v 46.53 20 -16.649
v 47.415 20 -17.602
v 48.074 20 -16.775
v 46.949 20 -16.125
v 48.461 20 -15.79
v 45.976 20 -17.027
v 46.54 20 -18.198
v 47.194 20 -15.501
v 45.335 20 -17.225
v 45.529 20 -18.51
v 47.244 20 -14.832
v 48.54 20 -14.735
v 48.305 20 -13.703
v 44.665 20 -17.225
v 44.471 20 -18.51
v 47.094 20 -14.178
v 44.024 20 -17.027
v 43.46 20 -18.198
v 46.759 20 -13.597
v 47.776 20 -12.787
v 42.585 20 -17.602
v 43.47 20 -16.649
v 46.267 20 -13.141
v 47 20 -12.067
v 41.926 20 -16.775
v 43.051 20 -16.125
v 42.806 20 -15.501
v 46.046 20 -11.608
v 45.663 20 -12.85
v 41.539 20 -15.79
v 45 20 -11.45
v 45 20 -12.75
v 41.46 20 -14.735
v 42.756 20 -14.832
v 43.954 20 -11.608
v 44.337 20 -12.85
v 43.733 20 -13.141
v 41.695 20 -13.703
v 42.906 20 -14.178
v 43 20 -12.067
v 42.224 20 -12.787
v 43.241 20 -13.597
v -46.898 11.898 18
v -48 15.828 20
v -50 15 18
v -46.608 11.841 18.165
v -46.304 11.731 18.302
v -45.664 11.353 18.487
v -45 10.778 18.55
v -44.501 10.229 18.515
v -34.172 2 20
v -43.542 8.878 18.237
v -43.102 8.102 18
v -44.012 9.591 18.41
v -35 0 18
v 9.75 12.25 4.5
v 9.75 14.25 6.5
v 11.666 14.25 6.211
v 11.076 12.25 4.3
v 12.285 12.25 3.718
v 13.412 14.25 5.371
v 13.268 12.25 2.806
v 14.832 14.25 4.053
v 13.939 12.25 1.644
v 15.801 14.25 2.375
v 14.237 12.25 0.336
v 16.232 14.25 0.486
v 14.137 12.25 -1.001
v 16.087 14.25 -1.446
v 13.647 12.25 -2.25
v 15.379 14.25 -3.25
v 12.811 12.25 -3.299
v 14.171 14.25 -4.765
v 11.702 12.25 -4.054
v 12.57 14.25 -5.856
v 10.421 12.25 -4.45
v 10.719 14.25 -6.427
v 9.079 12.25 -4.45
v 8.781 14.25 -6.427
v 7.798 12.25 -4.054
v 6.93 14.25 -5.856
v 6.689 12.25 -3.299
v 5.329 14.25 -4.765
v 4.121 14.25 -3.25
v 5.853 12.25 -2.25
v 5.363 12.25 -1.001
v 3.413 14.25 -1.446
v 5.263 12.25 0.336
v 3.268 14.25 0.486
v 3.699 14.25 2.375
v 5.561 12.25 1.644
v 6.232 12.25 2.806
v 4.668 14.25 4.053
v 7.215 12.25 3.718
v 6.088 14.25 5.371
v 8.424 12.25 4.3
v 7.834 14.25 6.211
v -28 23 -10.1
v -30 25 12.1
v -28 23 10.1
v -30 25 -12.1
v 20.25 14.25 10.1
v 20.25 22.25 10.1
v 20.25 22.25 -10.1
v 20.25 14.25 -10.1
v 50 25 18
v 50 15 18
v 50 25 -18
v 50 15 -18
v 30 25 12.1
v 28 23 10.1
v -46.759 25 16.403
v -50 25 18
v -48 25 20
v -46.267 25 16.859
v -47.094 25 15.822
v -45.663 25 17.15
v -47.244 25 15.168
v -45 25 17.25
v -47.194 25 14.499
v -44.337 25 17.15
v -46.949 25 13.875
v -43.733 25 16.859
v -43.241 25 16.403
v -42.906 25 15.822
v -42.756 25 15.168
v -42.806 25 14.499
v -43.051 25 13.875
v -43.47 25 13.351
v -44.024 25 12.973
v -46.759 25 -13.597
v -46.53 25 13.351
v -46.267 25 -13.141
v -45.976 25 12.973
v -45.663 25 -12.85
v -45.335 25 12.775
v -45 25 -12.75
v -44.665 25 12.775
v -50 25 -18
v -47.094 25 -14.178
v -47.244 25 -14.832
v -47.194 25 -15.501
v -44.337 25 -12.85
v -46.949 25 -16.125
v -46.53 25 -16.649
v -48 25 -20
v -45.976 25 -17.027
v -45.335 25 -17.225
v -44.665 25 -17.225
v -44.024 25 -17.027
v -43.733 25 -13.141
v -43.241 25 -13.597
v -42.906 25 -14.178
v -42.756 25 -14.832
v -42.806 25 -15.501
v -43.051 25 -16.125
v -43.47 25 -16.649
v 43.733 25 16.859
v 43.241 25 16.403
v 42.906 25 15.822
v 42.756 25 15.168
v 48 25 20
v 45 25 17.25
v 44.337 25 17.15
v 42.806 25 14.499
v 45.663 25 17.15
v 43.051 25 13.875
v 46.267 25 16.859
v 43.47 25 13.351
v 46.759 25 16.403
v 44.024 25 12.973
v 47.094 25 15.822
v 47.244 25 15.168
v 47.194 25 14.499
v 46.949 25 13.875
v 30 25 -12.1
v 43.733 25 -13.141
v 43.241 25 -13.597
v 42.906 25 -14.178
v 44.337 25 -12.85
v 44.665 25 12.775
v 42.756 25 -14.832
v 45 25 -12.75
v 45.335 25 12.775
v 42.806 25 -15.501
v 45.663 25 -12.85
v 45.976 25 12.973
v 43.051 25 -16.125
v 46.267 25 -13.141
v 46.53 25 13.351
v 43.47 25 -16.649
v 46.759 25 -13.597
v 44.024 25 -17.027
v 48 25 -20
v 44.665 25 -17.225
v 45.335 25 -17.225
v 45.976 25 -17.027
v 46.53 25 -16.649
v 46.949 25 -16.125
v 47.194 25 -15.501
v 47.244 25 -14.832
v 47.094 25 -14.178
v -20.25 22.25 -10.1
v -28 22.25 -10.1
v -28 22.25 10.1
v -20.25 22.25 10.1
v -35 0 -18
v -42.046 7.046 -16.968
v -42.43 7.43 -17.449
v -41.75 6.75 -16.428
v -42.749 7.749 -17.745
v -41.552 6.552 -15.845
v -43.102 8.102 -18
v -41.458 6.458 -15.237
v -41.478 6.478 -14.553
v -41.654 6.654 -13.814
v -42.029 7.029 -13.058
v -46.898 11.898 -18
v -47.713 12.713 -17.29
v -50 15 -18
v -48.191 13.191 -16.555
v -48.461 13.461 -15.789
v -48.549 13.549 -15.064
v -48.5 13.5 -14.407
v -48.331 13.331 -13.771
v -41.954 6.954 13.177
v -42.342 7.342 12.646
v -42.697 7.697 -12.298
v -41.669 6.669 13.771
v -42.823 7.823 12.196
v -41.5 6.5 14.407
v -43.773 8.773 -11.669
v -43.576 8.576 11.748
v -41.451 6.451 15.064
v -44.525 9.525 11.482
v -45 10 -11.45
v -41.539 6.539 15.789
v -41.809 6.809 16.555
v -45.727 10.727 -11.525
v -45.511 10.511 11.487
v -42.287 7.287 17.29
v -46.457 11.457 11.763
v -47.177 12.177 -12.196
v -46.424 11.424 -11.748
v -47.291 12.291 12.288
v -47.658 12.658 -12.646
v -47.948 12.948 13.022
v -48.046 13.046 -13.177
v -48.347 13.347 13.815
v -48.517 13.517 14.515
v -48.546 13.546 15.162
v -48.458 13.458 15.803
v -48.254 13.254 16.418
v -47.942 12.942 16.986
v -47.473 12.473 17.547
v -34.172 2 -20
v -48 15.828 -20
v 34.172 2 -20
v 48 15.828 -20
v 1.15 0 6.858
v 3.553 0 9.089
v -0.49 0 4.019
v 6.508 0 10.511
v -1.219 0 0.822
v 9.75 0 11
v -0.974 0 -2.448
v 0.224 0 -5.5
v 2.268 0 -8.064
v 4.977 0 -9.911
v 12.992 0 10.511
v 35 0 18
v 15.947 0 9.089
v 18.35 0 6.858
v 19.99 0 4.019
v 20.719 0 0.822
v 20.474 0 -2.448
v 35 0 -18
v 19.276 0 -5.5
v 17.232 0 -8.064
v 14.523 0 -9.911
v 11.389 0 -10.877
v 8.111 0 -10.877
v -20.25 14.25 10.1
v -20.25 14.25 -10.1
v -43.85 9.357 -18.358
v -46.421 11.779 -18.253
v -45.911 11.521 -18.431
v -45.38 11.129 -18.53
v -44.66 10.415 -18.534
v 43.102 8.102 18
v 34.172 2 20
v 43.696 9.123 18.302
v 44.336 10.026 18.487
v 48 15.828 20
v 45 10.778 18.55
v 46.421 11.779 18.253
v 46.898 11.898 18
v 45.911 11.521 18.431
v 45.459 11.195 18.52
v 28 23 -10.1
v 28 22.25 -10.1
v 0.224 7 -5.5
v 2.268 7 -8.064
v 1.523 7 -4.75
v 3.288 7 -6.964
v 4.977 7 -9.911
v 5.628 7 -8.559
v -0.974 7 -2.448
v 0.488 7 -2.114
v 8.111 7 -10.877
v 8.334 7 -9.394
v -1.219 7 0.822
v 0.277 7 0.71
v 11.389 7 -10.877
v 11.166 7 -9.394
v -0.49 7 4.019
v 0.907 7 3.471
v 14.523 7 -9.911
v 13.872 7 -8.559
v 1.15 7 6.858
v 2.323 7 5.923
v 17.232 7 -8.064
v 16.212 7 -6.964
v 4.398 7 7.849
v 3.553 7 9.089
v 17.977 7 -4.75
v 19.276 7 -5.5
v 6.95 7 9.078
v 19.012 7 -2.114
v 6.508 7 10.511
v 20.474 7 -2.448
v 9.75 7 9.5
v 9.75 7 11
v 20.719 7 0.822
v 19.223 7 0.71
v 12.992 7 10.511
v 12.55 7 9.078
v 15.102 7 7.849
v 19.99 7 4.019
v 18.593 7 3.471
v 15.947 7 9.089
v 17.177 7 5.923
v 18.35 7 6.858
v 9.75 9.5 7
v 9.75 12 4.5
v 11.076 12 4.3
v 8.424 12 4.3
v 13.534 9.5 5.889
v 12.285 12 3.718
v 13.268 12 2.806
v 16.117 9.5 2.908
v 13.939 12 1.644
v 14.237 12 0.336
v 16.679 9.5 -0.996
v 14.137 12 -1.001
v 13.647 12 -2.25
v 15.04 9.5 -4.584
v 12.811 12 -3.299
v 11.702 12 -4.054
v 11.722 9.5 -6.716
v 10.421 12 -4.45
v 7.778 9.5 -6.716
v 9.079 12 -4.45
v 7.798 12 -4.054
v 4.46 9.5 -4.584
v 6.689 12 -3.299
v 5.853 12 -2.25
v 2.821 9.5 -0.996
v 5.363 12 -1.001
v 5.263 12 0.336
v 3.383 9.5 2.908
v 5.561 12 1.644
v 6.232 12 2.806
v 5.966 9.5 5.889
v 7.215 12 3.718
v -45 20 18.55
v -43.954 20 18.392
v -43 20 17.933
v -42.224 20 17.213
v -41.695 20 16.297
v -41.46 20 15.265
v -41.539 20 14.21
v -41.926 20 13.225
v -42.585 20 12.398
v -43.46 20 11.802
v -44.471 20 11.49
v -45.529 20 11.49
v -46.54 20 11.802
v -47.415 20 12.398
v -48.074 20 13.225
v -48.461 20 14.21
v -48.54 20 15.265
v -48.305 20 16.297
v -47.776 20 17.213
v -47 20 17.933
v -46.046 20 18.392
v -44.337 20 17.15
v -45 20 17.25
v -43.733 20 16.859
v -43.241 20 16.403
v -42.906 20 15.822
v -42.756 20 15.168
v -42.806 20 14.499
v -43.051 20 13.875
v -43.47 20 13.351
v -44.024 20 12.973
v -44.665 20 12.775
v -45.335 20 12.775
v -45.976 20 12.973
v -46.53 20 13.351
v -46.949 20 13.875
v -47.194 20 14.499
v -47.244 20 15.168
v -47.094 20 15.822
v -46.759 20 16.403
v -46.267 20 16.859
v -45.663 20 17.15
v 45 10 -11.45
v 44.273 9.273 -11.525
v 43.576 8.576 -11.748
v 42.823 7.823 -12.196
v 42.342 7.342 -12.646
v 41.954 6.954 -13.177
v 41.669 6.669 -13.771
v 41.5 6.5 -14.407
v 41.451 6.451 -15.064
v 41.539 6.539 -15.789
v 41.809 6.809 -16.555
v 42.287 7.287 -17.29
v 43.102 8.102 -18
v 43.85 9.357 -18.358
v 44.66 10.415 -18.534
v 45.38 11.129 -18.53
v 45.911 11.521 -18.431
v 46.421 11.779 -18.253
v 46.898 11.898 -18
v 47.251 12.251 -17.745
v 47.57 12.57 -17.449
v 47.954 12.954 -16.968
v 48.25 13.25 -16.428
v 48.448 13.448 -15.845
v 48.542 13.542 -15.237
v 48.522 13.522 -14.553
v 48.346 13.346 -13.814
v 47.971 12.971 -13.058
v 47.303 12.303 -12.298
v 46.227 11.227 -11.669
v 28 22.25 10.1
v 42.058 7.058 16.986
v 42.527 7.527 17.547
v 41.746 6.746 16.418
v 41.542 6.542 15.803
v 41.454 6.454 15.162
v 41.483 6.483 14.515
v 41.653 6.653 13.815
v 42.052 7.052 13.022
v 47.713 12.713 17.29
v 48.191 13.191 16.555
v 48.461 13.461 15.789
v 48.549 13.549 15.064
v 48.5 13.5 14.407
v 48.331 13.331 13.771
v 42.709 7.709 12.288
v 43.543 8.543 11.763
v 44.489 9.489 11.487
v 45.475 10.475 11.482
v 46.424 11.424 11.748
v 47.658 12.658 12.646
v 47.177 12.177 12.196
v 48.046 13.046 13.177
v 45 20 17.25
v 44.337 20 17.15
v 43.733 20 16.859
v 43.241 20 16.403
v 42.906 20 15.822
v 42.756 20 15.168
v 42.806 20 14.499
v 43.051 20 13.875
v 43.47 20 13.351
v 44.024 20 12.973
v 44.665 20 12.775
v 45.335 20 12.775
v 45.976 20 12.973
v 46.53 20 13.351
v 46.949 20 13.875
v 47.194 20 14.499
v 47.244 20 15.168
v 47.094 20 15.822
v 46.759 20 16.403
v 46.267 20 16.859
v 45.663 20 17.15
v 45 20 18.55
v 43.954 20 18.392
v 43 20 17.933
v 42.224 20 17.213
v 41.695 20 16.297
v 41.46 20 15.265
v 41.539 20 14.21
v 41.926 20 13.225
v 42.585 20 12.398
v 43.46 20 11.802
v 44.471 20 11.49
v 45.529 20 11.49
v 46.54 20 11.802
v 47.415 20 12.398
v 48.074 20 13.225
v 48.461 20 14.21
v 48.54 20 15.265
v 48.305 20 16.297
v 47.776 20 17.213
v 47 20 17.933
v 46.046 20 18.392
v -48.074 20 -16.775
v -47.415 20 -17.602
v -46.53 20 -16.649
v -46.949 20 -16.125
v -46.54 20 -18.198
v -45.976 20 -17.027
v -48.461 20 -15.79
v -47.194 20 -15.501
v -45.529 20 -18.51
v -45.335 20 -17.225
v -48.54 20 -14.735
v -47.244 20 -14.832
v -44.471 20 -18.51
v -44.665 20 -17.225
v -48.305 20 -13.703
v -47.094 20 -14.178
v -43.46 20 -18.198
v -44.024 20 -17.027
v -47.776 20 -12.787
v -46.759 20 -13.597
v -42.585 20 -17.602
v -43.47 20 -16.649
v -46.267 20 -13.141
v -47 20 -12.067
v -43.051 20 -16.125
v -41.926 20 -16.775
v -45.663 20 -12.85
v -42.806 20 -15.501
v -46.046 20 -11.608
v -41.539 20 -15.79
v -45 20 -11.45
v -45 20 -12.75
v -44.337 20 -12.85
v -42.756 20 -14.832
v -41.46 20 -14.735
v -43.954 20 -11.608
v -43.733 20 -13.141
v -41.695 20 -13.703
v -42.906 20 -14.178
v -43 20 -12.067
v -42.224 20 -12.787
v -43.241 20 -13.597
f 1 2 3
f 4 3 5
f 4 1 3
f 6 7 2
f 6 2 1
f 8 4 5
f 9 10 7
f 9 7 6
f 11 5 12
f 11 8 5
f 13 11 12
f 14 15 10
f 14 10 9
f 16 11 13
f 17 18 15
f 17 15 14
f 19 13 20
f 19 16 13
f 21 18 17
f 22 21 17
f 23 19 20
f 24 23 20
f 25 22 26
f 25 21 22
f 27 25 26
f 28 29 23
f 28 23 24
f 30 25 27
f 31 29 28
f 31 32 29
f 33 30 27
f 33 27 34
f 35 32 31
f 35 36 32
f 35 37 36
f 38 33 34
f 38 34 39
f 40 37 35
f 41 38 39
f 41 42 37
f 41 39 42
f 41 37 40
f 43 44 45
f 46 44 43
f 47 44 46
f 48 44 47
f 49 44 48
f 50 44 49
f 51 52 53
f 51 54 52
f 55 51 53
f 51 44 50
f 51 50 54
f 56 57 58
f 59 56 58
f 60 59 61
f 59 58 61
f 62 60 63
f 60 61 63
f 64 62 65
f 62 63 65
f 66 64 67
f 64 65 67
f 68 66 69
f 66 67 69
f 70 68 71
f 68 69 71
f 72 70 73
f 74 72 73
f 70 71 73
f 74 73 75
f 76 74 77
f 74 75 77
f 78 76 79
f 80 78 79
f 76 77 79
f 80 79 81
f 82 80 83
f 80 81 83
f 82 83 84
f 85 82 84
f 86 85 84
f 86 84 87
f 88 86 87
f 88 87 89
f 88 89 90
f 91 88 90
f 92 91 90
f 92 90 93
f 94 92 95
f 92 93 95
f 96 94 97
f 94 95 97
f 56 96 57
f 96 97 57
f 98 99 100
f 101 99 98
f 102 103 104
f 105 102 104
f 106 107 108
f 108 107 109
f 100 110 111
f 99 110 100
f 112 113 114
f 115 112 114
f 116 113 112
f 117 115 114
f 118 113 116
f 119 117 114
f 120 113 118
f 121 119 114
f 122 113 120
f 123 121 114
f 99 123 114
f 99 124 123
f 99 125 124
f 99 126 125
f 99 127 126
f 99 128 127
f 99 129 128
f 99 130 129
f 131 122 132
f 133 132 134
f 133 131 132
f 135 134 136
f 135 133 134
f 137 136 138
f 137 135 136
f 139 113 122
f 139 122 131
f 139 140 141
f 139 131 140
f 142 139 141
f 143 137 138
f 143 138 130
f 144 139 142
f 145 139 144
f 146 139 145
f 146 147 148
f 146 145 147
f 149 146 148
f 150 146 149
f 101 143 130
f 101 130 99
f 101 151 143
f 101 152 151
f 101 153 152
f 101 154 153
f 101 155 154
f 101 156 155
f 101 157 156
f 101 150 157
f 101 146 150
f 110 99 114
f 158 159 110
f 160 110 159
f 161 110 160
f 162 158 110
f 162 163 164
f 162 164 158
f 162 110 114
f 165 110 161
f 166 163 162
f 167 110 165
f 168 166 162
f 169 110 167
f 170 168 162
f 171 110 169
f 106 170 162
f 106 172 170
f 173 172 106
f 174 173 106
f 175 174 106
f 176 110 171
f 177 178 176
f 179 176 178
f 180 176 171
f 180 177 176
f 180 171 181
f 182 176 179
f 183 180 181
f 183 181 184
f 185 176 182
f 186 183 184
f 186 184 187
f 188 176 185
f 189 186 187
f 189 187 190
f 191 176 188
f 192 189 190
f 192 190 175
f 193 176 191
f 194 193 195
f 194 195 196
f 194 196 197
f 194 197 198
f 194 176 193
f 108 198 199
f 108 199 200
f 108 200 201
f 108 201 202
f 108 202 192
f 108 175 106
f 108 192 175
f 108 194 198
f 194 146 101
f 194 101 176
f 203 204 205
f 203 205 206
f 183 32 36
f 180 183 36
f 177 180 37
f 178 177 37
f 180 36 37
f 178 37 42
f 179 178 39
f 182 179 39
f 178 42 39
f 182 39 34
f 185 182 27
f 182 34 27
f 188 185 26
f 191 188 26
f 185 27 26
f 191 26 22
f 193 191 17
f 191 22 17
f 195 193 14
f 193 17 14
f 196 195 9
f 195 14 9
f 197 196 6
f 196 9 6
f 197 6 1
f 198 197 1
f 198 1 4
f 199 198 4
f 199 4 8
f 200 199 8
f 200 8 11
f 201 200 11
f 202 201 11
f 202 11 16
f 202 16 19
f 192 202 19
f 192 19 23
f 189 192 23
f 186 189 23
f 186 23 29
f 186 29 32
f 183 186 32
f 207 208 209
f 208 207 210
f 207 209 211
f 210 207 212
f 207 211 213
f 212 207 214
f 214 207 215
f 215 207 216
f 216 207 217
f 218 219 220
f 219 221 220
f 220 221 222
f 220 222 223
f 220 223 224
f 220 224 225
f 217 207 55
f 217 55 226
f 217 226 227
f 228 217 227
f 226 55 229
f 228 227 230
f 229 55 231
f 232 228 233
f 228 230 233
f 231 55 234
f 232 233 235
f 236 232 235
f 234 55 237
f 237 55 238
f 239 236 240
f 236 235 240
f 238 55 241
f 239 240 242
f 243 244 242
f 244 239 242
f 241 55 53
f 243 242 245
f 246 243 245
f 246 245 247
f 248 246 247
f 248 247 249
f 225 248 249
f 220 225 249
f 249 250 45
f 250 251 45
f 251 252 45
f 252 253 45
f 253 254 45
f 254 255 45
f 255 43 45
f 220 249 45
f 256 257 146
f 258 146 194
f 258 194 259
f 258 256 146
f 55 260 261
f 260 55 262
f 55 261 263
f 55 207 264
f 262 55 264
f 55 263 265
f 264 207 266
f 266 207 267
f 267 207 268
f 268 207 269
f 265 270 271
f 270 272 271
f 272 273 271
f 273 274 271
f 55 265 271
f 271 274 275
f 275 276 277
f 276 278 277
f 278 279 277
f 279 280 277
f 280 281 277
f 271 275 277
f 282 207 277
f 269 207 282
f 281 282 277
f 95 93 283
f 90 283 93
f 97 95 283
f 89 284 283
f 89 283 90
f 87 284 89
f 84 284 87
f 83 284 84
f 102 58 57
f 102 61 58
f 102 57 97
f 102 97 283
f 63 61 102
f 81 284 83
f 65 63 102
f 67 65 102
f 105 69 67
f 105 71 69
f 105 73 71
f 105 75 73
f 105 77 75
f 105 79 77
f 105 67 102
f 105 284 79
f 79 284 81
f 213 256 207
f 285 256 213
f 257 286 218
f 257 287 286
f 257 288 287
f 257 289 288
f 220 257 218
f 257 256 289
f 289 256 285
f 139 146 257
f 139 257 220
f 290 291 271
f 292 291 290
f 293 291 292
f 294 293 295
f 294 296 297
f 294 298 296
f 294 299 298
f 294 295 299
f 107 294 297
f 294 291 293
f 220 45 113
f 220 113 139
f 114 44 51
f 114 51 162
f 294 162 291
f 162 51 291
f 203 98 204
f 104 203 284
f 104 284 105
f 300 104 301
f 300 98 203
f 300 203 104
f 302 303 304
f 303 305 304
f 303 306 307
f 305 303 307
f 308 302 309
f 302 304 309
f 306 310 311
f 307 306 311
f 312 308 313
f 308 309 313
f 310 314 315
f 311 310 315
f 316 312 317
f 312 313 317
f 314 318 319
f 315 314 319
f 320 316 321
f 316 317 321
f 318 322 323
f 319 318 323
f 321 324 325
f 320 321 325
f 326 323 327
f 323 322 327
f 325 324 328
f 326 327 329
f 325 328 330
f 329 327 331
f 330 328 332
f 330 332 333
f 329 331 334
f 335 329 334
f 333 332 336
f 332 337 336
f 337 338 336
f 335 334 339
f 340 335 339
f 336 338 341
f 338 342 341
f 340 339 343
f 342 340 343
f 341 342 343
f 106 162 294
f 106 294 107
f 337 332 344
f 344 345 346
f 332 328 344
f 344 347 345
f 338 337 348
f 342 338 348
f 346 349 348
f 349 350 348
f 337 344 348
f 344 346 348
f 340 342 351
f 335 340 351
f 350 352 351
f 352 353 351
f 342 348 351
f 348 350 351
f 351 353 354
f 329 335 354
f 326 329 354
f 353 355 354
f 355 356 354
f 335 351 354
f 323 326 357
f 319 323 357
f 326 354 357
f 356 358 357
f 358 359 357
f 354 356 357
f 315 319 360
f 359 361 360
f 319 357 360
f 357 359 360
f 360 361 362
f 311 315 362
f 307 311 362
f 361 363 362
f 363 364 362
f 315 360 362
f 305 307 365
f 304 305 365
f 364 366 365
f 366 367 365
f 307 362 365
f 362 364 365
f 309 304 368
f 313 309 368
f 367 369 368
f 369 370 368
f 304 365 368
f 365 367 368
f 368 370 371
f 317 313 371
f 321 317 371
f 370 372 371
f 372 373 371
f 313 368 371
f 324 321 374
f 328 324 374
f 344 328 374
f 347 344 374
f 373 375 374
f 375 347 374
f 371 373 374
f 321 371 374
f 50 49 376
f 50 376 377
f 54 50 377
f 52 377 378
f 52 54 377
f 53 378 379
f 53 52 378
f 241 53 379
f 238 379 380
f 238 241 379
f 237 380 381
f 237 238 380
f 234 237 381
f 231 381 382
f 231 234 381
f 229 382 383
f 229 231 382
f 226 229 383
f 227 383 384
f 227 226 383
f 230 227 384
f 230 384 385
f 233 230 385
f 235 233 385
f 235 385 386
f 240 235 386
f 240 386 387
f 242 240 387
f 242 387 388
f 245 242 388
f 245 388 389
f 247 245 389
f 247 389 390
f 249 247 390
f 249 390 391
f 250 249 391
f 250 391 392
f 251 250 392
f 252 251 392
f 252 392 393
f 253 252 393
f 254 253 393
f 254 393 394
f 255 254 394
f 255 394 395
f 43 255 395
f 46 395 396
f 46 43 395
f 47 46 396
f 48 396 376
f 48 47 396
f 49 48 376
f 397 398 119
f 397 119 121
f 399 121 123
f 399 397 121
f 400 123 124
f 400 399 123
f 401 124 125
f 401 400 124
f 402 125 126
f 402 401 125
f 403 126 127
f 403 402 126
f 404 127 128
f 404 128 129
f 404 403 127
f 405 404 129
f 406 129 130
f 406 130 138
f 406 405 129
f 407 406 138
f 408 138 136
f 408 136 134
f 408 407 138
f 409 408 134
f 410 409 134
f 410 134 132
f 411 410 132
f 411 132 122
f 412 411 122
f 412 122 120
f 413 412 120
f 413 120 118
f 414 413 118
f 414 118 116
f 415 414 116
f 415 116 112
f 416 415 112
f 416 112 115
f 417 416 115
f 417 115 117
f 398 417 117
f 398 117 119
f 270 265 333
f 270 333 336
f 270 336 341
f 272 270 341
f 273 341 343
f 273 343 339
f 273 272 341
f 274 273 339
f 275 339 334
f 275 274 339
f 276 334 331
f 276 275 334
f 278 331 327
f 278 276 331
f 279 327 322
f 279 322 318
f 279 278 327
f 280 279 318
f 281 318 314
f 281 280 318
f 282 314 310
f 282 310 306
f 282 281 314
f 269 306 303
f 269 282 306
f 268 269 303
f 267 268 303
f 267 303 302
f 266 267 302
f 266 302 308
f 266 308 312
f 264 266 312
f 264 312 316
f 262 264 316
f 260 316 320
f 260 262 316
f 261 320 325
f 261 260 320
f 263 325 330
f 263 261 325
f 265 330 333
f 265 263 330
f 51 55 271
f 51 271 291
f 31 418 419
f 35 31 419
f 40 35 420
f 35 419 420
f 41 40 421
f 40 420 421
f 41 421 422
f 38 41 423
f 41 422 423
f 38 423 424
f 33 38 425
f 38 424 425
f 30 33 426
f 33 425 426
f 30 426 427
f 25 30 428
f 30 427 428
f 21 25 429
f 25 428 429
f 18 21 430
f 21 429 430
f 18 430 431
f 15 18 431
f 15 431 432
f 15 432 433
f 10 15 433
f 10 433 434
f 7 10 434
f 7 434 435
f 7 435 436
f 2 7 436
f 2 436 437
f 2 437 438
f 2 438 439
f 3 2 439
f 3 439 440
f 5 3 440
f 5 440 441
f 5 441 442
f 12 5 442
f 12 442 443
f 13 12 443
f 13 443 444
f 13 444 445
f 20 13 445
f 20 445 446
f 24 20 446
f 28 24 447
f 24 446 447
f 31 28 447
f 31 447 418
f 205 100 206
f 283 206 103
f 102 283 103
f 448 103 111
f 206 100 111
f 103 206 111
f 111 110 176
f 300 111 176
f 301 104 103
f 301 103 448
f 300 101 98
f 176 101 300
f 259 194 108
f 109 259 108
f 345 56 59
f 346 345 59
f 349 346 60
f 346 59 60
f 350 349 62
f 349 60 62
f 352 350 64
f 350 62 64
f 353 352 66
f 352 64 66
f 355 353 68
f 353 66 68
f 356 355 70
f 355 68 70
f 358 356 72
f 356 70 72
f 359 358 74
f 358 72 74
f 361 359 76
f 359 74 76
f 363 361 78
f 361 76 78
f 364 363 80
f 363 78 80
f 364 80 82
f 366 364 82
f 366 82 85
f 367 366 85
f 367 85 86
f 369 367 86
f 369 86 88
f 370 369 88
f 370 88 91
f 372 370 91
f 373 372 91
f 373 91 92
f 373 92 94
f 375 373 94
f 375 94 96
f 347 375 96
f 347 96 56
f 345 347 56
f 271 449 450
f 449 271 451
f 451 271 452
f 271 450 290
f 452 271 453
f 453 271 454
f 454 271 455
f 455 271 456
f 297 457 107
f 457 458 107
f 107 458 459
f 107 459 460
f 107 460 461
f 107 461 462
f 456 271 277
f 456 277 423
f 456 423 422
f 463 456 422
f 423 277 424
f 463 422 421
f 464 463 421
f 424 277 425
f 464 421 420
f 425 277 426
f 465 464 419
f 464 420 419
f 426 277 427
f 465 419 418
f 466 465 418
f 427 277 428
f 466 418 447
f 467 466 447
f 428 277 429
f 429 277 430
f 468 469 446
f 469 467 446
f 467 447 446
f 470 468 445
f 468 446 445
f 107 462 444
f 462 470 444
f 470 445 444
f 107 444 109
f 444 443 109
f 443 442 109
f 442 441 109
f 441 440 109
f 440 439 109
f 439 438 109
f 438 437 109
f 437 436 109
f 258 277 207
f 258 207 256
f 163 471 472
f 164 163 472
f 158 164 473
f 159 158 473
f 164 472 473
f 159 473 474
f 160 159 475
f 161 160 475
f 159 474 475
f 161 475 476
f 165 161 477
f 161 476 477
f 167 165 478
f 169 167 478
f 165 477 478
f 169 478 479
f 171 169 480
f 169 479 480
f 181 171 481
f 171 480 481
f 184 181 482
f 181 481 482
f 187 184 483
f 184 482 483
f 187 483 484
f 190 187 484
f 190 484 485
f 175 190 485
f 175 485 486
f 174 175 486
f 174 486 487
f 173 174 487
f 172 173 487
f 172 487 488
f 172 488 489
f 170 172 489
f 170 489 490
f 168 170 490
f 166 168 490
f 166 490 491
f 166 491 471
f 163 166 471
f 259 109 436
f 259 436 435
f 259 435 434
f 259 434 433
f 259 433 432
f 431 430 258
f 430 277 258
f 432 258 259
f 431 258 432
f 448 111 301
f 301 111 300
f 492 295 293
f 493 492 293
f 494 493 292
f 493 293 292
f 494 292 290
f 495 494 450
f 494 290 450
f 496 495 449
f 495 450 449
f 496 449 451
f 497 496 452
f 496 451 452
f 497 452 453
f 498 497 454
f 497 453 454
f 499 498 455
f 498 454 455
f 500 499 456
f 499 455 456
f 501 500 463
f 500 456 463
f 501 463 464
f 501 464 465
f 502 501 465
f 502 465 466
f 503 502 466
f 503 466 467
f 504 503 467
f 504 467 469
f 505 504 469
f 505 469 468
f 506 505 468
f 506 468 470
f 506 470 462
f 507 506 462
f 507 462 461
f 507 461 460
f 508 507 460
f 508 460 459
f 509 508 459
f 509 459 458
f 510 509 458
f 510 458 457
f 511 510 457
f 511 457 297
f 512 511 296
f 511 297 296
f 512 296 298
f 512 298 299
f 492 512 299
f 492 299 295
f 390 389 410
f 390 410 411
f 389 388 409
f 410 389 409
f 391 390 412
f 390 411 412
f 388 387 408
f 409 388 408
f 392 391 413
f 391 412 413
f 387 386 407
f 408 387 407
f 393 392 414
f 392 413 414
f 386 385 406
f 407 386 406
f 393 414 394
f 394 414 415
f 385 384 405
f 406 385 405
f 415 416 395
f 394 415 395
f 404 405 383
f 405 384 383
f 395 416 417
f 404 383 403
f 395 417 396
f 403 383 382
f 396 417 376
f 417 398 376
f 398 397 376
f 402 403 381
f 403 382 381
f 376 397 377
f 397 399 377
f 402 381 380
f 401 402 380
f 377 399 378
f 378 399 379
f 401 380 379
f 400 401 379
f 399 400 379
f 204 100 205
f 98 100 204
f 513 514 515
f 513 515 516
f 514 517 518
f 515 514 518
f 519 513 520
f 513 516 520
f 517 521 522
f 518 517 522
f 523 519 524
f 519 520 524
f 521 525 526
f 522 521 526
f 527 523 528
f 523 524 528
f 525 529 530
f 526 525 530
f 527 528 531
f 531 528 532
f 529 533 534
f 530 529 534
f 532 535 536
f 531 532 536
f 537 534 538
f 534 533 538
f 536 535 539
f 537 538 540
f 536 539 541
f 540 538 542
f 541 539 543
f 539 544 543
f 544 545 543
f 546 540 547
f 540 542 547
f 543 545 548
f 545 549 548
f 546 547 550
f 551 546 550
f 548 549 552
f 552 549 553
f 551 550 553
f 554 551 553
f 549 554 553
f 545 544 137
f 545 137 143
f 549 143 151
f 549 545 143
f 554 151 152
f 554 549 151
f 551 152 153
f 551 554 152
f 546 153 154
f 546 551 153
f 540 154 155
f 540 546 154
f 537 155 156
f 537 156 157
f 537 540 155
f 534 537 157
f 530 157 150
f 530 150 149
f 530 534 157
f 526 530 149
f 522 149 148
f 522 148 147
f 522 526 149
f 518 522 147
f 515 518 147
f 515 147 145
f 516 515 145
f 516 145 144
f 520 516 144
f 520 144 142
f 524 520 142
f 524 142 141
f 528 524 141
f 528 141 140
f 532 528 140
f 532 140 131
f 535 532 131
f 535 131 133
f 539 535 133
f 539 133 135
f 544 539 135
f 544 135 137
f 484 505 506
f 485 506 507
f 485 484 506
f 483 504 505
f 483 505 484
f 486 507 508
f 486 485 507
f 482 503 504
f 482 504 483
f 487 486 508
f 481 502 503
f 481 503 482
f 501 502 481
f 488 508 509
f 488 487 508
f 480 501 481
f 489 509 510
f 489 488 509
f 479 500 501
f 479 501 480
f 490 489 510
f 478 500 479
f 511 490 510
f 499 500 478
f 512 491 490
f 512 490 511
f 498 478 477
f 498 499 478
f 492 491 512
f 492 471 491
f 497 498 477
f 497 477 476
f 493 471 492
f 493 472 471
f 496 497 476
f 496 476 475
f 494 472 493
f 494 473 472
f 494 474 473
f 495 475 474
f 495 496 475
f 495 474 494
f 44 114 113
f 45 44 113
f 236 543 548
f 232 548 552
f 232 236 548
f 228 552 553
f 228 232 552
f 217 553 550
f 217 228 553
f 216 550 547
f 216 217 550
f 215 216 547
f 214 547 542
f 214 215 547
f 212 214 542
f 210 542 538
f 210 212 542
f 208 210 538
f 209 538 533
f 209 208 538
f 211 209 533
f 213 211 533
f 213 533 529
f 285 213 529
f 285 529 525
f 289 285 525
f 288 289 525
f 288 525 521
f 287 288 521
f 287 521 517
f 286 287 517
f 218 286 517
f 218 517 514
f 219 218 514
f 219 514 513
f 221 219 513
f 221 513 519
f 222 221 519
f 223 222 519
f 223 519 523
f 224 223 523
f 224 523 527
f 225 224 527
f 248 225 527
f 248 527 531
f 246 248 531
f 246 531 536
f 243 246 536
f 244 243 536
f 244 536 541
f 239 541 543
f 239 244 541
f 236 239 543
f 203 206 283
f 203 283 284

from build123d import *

# Parameters (mm, degrees)
SKETCH1_W           = 100
SKETCH1_H           = 40
BOSS_EXTRUDE1_DEPTH = 25
SKETCH2_R           = 2.25
CUT_EXTRUDE1_DEPTH  = 25
SKETCH3_R           = 3.55
CUT_EXTRUDE2_DEPTH  = 20
SKETCH4_W           = 56
SKETCH4_H           = 20.2
CUT_EXTRUDE3_DEPTH  = 2.75
SKETCH5_W           = 40.5
SKETCH5_H           = 20.2
CUT_EXTRUDE4_DEPTH  = 10.75
SKETCH6_R           = 4.5
CUT_EXTRUDE5_DEPTH  = 60.371710435
SKETCH7_R           = 11
CUT_EXTRUDE6_DEPTH  = 7
CHAMFER1_SIZE       = 5
CHAMFER2_SIZE       = 15
CHAMFER3_SIZE       = 2
CHAMFER4_SIZE       = 2
CHAMFER5_SIZE       = 2


with BuildPart() as part:
    # Sketch1 → Boss-Extrude1 (new body)
    with BuildSketch(Plane(origin=(0, 0, 0), x_dir=(1, 0, 0), z_dir=(0, 1, 0))):
        Rectangle(SKETCH1_W, SKETCH1_H)
    extrude(amount=BOSS_EXTRUDE1_DEPTH)

    # Sketch2 → Cut-Extrude1 (cut)
    with BuildSketch(Plane(origin=(0, 0, 0), x_dir=(1, 0, 0), z_dir=(0, 1, 0))):
        with Locations(Location((-45, -15, 0), (0, 0, 270))):
            Circle(SKETCH2_R)
        with Locations(Location((-45, 15, 0), (0, 0, 270))):
            Circle(SKETCH2_R)
    cut_extrude1 = extrude(amount=CUT_EXTRUDE1_DEPTH, mode=Mode.SUBTRACT)

    # Mirror1: Cut-Extrude1 across plane
    add(cut_extrude1.mirror(Plane(origin=(0, 0, 0), x_dir=(0, 0, 1), z_dir=(1, 0, 0))), mode=Mode.SUBTRACT)

    # Sketch3 → Cut-Extrude2 (cut)
    with BuildSketch(Plane(origin=(0, 0, 0), x_dir=(1, 0, 0), z_dir=(0, 1, 0))):
        with Locations(Location((-45, 15, 0), (0, 0, 270))):
            Circle(SKETCH3_R)
        with Locations(Location((-45, -15, 0), (0, 0, 270))):
            Circle(SKETCH3_R)
    cut_extrude2 = extrude(amount=CUT_EXTRUDE2_DEPTH, mode=Mode.SUBTRACT)

    # Mirror2: Cut-Extrude2 across plane
    add(cut_extrude2.mirror(Plane(origin=(0, 0, 0), x_dir=(0, 0, 1), z_dir=(1, 0, 0))), mode=Mode.SUBTRACT)

    # Sketch4 → Cut-Extrude3 (cut)
    with BuildSketch(Plane(origin=(0, 25, 0), x_dir=(1, 0, 0), z_dir=(0, 1, 0))):
        Rectangle(SKETCH4_W, SKETCH4_H)
    extrude(amount=-CUT_EXTRUDE3_DEPTH, mode=Mode.SUBTRACT)

    # Sketch5 → Cut-Extrude4 (cut)
    with BuildSketch(Plane(origin=(0, 25, 0), x_dir=(1, 0, 0), z_dir=(0, 1, 0))):
        Rectangle(SKETCH5_W, SKETCH5_H)
    extrude(amount=-CUT_EXTRUDE4_DEPTH, mode=Mode.SUBTRACT)

    # Sketch6 → Cut-Extrude5 (cut, through all)
    with BuildSketch(Plane(origin=(0, 25, 0), x_dir=(1, 0, 0), z_dir=(0, 1, 0))):
        with Locations(Location((9.75, 0, 0), (0, 0, 270))):
            Circle(SKETCH6_R)
    extrude(amount=-CUT_EXTRUDE5_DEPTH, mode=Mode.SUBTRACT)

    # Sketch7 → Cut-Extrude6 (cut)
    with BuildSketch(Plane(origin=(0, 0, 0), x_dir=(1, 0, 0), z_dir=(0, 1, 0))):
        with Locations(Location((9.75, 0, 0), (0, 0, 270))):
            Circle(SKETCH7_R)
    extrude(amount=CUT_EXTRUDE6_DEPTH, mode=Mode.SUBTRACT)

    # Chamfer1
    chamfer1_edges = [part.edges().sort_by_distance(p)[0] for p in [
        (9.75, 7, -4.5),
    ]]
    chamfer(chamfer1_edges, length=CHAMFER1_SIZE)

    # Chamfer2
    # the kernel refuses this chamfer: 15 mm, written as the material it takes off along each edge
    with BuildSketch(Plane(origin=(50, 0, -58.575244819), x_dir=(-0.9996219169112968, -0.02749587661058637, 0), z_dir=(0, 0, 1)), Plane(origin=(-50, 0, 58.575244819), x_dir=(0.9996219169112968, -0.02749587661058637, 0), z_dir=(0, 0, -1))) as chamfer2_piece_1:
        Polygon((CHAMFER2_SIZE * 0.999621916911, -CHAMFER2_SIZE * 0.0274958766106), (-CHAMFER2_SIZE * 0.0274958766106, -CHAMFER2_SIZE * 0.999621916911), (0, 0), align=None)
    extrude(amount=117.150489639, mode=Mode.SUBTRACT)

    # Chamfer3
    # the kernel refuses this chamfer: 2 mm, written as the material it takes off along each edge
    with BuildSketch(Plane(origin=(50, 9.856634024, -20), x_dir=(-0.9996219169112968, 0, -0.027495876610585647), z_dir=(0, 1, 0)), Plane(origin=(-50, 9.856634024, 20), x_dir=(0.9996219169112968, 0, 0.027495876610585647), z_dir=(0, 1, 0))) as chamfer3_piece_1:
        Polygon((CHAMFER3_SIZE * 0.999621916911, CHAMFER3_SIZE * 0.0274958766106), (-CHAMFER3_SIZE * 0.0274958766106, CHAMFER3_SIZE * 0.999621916911), (0, 0), align=None)
    extrude(amount=20.286731952, mode=Mode.SUBTRACT)
    with BuildSketch(Plane(origin=(31.36309104, -3.63690896, -20), x_dir=(0.01944252080602223, -0.01944252080600668, 0.9996219169112968), z_dir=(0.7071067811862648, 0.7071067811868302, 0))) as chamfer3_piece_2:
        Polygon((CHAMFER3_SIZE * 0.999621916911, -CHAMFER3_SIZE * 0.0274958766106), (-CHAMFER3_SIZE * 0.0274958766106, -CHAMFER3_SIZE * 0.999621916911), (0, 0), align=None)
    extrude(amount=31.499935387, mode=Mode.SUBTRACT)
    with BuildSketch(Plane(origin=(-40.143365976, 0, -20), x_dir=(0, -0.02749587661058639, 0.9996219169112968), z_dir=(1, 0, 0)), Plane(origin=(40.143365976, 0, 20), x_dir=(0, -0.02749587661058639, -0.9996219169112968), z_dir=(-1, 0, 0))) as chamfer3_piece_3:
        Polygon((CHAMFER3_SIZE * 0.999621916911, -CHAMFER3_SIZE * 0.0274958766106), (-CHAMFER3_SIZE * 0.0274958766106, -CHAMFER3_SIZE * 0.999621916911), (0, 0), align=None)
    extrude(amount=80.286731952, mode=Mode.SUBTRACT)
    with BuildSketch(Plane(origin=(-53.63690896, 18.63690896, -20), x_dir=(0.706839436070956, 0.7068394360703909, -0.02749587661058563), z_dir=(0.7071067811862648, -0.7071067811868302, 0)), Plane(origin=(-31.36309104, -3.63690896, 20), x_dir=(0.7068394360709562, 0.7068394360703909, 0.027495876610585616), z_dir=(-0.7071067811862648, 0.7071067811868302, 0)), Plane(origin=(53.63690896, 18.63690896, 20), x_dir=(-0.706839436070956, 0.7068394360703909, 0.02749587661058563), z_dir=(-0.7071067811862648, -0.7071067811868302, 0))) as chamfer3_piece_4:
        Polygon((CHAMFER3_SIZE * 0.999621916911, CHAMFER3_SIZE * 0.0274958766106), (-CHAMFER3_SIZE * 0.0274958766106, CHAMFER3_SIZE * 0.999621916911), (0, 0), align=None)
    extrude(amount=31.499935387, mode=Mode.SUBTRACT)
    with BuildSketch(Plane(origin=(-50, 9.856634024, -20), x_dir=(0.9996219169112968, 0, -0.027495876610585647), z_dir=(0, 1, 0)), Plane(origin=(50, 9.856634024, 20), x_dir=(-0.9996219169112968, 0, 0.027495876610585647), z_dir=(0, 1, 0))) as chamfer3_piece_5:
        Polygon((CHAMFER3_SIZE * 0.999621916911, -CHAMFER3_SIZE * 0.0274958766106), (-CHAMFER3_SIZE * 0.0274958766106, -CHAMFER3_SIZE * 0.999621916911), (0, 0), align=None)
    extrude(amount=20.286731952, mode=Mode.SUBTRACT)

    # Chamfer4
    chamfer4_edges = [part.edges().sort_by_distance(p)[0] for p in [
        (9.75, 14.25, -4.5),
    ]]
    chamfer(chamfer4_edges, length=CHAMFER4_SIZE)

    # Chamfer5
    chamfer5_edges = [part.edges().sort_by_distance(p)[0] for p in [
        (0, 25, -10.1),
        (-28, 25, 0),
        (0, 25, 10.1),
        (28, 25, 0),
    ]]
    chamfer(chamfer5_edges, length=CHAMFER5_SIZE)


solid = part.part
